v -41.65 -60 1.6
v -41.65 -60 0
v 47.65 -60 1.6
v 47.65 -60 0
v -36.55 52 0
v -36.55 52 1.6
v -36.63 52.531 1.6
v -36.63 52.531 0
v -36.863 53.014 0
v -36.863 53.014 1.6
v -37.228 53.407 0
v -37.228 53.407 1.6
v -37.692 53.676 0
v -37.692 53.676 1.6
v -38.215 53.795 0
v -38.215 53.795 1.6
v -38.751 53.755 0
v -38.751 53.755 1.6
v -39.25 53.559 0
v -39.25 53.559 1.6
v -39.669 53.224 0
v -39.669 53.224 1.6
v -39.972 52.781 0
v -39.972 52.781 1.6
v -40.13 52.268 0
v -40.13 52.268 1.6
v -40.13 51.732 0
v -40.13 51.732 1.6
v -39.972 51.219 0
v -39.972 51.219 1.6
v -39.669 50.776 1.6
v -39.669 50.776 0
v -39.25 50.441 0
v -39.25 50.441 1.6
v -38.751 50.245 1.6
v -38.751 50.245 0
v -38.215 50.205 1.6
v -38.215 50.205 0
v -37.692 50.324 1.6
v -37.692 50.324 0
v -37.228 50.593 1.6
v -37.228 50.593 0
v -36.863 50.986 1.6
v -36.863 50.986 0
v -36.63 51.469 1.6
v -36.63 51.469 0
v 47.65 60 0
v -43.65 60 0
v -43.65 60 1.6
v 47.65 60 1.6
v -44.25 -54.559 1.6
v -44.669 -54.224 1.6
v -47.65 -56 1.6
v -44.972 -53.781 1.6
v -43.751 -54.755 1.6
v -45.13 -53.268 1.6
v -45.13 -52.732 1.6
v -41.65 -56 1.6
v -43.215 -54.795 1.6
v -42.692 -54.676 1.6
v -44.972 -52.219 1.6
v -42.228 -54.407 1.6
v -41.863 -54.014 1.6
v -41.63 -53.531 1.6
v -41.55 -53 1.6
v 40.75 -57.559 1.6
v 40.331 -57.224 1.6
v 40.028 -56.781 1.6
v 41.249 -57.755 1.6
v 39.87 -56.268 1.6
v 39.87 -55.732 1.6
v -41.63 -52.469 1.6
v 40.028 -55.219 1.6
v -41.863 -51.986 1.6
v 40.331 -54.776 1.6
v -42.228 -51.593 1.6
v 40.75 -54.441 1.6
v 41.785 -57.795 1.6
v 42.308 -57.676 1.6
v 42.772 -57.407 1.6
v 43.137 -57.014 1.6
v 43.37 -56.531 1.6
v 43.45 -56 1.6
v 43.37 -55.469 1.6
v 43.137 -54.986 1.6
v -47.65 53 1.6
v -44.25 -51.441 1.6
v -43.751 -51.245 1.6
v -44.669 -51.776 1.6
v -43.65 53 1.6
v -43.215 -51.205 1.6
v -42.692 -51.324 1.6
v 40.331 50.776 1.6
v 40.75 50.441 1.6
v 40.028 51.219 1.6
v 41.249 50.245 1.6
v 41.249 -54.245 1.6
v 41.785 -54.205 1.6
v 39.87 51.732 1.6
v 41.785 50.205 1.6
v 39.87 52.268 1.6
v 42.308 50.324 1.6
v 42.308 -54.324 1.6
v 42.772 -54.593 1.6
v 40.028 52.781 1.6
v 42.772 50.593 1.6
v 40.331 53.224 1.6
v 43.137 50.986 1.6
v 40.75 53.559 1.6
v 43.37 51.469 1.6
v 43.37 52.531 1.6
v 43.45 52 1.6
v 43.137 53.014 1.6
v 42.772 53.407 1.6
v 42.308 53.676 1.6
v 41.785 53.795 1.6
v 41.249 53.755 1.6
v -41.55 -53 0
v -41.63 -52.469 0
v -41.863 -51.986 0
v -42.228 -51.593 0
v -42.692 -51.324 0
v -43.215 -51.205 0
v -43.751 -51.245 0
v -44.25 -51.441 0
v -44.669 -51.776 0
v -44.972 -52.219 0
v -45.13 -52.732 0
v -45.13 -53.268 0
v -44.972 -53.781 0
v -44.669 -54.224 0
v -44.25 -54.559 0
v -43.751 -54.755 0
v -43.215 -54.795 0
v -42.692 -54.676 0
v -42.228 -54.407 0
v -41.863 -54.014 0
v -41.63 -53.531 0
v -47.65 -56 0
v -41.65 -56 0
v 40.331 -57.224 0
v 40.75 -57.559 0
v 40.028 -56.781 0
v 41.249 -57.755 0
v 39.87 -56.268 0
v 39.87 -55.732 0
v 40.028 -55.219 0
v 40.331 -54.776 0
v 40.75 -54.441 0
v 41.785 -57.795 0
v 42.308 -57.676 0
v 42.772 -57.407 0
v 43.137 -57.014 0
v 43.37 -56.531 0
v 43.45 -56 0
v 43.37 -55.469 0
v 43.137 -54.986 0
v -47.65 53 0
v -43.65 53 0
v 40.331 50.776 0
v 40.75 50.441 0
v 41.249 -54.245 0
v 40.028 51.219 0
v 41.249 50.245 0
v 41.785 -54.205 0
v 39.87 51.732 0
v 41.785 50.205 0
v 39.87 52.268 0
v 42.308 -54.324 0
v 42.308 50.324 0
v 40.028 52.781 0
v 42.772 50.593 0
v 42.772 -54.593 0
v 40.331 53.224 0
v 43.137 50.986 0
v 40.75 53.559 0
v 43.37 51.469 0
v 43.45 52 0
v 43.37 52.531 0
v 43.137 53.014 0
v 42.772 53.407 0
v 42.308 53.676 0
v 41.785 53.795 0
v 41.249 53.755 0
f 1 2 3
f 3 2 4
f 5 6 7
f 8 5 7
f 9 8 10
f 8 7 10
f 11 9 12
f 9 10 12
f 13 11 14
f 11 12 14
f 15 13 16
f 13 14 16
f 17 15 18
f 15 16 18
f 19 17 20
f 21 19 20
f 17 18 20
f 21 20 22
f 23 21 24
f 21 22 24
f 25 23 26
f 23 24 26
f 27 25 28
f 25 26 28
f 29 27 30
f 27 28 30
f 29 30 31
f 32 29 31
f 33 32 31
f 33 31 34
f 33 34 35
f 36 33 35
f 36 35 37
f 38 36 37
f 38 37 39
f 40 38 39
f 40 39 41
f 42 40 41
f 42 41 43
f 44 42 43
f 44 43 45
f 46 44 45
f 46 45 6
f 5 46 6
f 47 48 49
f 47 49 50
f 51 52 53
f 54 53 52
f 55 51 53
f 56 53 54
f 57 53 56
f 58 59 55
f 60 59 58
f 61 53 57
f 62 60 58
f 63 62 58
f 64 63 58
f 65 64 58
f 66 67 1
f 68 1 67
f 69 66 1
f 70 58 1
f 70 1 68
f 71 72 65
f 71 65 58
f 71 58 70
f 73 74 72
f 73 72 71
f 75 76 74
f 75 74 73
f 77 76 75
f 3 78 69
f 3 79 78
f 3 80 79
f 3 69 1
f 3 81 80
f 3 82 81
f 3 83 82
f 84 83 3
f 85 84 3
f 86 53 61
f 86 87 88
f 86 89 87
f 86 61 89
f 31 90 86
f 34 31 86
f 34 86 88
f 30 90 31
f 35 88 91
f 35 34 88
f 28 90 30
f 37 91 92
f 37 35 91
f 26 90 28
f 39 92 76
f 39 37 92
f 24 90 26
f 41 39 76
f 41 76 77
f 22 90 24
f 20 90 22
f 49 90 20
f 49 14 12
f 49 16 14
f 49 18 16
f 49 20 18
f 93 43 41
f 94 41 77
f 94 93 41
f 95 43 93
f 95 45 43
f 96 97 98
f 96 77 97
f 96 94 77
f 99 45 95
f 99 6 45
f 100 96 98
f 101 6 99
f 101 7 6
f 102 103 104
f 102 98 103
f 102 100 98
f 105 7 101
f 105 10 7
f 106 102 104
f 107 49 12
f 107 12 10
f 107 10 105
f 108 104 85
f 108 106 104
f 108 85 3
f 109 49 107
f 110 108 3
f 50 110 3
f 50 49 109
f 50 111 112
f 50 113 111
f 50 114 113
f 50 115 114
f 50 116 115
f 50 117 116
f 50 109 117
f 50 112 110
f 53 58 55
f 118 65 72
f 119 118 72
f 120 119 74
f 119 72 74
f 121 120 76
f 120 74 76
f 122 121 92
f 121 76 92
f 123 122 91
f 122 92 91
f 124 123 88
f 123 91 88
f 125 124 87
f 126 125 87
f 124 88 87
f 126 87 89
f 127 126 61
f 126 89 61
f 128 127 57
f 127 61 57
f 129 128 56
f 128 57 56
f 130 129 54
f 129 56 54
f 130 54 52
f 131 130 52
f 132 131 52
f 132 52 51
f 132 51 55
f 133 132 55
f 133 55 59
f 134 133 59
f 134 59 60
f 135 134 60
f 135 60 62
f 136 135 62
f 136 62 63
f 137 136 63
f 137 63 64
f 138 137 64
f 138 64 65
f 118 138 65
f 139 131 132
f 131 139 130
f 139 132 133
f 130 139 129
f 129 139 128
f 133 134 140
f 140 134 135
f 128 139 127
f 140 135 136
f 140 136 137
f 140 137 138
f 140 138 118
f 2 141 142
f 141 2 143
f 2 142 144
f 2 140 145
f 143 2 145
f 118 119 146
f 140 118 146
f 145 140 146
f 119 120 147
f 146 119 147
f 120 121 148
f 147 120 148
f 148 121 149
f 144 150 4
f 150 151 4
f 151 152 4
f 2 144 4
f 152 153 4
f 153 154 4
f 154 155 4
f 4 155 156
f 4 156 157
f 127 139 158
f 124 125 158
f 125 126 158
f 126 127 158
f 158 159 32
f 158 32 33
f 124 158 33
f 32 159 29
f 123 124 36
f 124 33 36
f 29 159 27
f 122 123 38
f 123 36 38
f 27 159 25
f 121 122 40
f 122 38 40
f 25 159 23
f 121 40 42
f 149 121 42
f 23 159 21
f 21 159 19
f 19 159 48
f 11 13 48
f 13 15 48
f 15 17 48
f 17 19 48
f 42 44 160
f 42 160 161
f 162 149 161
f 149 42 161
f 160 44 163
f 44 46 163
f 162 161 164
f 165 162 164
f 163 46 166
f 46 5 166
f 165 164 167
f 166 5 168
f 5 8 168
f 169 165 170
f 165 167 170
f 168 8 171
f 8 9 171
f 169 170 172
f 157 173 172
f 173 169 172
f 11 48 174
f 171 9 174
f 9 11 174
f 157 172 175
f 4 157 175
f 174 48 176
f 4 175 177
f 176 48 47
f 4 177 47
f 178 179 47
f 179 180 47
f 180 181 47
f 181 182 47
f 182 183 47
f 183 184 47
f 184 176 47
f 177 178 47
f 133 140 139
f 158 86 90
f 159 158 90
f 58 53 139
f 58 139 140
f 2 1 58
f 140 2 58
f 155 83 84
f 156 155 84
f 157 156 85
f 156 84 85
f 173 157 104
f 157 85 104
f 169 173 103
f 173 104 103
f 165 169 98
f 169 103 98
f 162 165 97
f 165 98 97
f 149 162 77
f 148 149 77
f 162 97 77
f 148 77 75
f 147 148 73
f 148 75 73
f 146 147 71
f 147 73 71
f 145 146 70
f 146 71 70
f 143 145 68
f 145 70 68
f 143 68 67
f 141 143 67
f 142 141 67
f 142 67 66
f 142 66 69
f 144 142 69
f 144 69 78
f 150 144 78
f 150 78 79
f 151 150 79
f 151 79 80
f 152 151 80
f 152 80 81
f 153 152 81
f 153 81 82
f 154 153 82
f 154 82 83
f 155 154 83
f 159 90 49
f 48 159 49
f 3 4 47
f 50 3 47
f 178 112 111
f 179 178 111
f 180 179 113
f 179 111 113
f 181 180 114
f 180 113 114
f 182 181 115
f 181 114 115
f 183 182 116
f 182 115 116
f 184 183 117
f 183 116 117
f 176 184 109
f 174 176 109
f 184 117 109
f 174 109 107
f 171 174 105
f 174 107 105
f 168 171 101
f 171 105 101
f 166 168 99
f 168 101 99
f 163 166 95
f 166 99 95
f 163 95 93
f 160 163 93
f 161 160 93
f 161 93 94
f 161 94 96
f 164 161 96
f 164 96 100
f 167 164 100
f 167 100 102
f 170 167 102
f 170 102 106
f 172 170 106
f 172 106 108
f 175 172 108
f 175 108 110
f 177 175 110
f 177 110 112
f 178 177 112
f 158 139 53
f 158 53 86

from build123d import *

# Parameters (mm, degrees)
SKETCH_2_W          = 95.3
SKETCH_2_H          = 120
EXTRUDE_2_DEPTH     = 1.6
SKETCH_3_R          = 1.8
SKETCH_3_W          = 4
SKETCH_3_H          = 7
SKETCH_3_W_2        = 6
SKETCH_3_H_2        = 4
CUT_EXTRUDE_1_DEPTH = 2.6


with BuildPart() as part:
    # 스케치2 → 보스-돌출2 (new body)
    with BuildSketch(Plane.XY):
        Rectangle(SKETCH_2_W, SKETCH_2_H)
    extrude(amount=EXTRUDE_2_DEPTH)

    # 스케치3 → 컷-돌출1 (cut, through all)
    with BuildSketch(Plane.XY.offset(1.6)):
        with Locations((-38.35, 52)):
            Circle(SKETCH_3_R)
        with Locations((41.65, 52)):
            Circle(SKETCH_3_R)
        with Locations((41.65, -56)):
            Circle(SKETCH_3_R)
        with Locations((-43.35, -53)):
            Circle(SKETCH_3_R)
        with Locations((-45.65, 56.5)):
            Rectangle(SKETCH_3_W, SKETCH_3_H)
        with Locations((-44.65, -58)):
            Rectangle(SKETCH_3_W_2, SKETCH_3_H_2)
    extrude(amount=-CUT_EXTRUDE_1_DEPTH, mode=Mode.SUBTRACT)


solid = part.part
